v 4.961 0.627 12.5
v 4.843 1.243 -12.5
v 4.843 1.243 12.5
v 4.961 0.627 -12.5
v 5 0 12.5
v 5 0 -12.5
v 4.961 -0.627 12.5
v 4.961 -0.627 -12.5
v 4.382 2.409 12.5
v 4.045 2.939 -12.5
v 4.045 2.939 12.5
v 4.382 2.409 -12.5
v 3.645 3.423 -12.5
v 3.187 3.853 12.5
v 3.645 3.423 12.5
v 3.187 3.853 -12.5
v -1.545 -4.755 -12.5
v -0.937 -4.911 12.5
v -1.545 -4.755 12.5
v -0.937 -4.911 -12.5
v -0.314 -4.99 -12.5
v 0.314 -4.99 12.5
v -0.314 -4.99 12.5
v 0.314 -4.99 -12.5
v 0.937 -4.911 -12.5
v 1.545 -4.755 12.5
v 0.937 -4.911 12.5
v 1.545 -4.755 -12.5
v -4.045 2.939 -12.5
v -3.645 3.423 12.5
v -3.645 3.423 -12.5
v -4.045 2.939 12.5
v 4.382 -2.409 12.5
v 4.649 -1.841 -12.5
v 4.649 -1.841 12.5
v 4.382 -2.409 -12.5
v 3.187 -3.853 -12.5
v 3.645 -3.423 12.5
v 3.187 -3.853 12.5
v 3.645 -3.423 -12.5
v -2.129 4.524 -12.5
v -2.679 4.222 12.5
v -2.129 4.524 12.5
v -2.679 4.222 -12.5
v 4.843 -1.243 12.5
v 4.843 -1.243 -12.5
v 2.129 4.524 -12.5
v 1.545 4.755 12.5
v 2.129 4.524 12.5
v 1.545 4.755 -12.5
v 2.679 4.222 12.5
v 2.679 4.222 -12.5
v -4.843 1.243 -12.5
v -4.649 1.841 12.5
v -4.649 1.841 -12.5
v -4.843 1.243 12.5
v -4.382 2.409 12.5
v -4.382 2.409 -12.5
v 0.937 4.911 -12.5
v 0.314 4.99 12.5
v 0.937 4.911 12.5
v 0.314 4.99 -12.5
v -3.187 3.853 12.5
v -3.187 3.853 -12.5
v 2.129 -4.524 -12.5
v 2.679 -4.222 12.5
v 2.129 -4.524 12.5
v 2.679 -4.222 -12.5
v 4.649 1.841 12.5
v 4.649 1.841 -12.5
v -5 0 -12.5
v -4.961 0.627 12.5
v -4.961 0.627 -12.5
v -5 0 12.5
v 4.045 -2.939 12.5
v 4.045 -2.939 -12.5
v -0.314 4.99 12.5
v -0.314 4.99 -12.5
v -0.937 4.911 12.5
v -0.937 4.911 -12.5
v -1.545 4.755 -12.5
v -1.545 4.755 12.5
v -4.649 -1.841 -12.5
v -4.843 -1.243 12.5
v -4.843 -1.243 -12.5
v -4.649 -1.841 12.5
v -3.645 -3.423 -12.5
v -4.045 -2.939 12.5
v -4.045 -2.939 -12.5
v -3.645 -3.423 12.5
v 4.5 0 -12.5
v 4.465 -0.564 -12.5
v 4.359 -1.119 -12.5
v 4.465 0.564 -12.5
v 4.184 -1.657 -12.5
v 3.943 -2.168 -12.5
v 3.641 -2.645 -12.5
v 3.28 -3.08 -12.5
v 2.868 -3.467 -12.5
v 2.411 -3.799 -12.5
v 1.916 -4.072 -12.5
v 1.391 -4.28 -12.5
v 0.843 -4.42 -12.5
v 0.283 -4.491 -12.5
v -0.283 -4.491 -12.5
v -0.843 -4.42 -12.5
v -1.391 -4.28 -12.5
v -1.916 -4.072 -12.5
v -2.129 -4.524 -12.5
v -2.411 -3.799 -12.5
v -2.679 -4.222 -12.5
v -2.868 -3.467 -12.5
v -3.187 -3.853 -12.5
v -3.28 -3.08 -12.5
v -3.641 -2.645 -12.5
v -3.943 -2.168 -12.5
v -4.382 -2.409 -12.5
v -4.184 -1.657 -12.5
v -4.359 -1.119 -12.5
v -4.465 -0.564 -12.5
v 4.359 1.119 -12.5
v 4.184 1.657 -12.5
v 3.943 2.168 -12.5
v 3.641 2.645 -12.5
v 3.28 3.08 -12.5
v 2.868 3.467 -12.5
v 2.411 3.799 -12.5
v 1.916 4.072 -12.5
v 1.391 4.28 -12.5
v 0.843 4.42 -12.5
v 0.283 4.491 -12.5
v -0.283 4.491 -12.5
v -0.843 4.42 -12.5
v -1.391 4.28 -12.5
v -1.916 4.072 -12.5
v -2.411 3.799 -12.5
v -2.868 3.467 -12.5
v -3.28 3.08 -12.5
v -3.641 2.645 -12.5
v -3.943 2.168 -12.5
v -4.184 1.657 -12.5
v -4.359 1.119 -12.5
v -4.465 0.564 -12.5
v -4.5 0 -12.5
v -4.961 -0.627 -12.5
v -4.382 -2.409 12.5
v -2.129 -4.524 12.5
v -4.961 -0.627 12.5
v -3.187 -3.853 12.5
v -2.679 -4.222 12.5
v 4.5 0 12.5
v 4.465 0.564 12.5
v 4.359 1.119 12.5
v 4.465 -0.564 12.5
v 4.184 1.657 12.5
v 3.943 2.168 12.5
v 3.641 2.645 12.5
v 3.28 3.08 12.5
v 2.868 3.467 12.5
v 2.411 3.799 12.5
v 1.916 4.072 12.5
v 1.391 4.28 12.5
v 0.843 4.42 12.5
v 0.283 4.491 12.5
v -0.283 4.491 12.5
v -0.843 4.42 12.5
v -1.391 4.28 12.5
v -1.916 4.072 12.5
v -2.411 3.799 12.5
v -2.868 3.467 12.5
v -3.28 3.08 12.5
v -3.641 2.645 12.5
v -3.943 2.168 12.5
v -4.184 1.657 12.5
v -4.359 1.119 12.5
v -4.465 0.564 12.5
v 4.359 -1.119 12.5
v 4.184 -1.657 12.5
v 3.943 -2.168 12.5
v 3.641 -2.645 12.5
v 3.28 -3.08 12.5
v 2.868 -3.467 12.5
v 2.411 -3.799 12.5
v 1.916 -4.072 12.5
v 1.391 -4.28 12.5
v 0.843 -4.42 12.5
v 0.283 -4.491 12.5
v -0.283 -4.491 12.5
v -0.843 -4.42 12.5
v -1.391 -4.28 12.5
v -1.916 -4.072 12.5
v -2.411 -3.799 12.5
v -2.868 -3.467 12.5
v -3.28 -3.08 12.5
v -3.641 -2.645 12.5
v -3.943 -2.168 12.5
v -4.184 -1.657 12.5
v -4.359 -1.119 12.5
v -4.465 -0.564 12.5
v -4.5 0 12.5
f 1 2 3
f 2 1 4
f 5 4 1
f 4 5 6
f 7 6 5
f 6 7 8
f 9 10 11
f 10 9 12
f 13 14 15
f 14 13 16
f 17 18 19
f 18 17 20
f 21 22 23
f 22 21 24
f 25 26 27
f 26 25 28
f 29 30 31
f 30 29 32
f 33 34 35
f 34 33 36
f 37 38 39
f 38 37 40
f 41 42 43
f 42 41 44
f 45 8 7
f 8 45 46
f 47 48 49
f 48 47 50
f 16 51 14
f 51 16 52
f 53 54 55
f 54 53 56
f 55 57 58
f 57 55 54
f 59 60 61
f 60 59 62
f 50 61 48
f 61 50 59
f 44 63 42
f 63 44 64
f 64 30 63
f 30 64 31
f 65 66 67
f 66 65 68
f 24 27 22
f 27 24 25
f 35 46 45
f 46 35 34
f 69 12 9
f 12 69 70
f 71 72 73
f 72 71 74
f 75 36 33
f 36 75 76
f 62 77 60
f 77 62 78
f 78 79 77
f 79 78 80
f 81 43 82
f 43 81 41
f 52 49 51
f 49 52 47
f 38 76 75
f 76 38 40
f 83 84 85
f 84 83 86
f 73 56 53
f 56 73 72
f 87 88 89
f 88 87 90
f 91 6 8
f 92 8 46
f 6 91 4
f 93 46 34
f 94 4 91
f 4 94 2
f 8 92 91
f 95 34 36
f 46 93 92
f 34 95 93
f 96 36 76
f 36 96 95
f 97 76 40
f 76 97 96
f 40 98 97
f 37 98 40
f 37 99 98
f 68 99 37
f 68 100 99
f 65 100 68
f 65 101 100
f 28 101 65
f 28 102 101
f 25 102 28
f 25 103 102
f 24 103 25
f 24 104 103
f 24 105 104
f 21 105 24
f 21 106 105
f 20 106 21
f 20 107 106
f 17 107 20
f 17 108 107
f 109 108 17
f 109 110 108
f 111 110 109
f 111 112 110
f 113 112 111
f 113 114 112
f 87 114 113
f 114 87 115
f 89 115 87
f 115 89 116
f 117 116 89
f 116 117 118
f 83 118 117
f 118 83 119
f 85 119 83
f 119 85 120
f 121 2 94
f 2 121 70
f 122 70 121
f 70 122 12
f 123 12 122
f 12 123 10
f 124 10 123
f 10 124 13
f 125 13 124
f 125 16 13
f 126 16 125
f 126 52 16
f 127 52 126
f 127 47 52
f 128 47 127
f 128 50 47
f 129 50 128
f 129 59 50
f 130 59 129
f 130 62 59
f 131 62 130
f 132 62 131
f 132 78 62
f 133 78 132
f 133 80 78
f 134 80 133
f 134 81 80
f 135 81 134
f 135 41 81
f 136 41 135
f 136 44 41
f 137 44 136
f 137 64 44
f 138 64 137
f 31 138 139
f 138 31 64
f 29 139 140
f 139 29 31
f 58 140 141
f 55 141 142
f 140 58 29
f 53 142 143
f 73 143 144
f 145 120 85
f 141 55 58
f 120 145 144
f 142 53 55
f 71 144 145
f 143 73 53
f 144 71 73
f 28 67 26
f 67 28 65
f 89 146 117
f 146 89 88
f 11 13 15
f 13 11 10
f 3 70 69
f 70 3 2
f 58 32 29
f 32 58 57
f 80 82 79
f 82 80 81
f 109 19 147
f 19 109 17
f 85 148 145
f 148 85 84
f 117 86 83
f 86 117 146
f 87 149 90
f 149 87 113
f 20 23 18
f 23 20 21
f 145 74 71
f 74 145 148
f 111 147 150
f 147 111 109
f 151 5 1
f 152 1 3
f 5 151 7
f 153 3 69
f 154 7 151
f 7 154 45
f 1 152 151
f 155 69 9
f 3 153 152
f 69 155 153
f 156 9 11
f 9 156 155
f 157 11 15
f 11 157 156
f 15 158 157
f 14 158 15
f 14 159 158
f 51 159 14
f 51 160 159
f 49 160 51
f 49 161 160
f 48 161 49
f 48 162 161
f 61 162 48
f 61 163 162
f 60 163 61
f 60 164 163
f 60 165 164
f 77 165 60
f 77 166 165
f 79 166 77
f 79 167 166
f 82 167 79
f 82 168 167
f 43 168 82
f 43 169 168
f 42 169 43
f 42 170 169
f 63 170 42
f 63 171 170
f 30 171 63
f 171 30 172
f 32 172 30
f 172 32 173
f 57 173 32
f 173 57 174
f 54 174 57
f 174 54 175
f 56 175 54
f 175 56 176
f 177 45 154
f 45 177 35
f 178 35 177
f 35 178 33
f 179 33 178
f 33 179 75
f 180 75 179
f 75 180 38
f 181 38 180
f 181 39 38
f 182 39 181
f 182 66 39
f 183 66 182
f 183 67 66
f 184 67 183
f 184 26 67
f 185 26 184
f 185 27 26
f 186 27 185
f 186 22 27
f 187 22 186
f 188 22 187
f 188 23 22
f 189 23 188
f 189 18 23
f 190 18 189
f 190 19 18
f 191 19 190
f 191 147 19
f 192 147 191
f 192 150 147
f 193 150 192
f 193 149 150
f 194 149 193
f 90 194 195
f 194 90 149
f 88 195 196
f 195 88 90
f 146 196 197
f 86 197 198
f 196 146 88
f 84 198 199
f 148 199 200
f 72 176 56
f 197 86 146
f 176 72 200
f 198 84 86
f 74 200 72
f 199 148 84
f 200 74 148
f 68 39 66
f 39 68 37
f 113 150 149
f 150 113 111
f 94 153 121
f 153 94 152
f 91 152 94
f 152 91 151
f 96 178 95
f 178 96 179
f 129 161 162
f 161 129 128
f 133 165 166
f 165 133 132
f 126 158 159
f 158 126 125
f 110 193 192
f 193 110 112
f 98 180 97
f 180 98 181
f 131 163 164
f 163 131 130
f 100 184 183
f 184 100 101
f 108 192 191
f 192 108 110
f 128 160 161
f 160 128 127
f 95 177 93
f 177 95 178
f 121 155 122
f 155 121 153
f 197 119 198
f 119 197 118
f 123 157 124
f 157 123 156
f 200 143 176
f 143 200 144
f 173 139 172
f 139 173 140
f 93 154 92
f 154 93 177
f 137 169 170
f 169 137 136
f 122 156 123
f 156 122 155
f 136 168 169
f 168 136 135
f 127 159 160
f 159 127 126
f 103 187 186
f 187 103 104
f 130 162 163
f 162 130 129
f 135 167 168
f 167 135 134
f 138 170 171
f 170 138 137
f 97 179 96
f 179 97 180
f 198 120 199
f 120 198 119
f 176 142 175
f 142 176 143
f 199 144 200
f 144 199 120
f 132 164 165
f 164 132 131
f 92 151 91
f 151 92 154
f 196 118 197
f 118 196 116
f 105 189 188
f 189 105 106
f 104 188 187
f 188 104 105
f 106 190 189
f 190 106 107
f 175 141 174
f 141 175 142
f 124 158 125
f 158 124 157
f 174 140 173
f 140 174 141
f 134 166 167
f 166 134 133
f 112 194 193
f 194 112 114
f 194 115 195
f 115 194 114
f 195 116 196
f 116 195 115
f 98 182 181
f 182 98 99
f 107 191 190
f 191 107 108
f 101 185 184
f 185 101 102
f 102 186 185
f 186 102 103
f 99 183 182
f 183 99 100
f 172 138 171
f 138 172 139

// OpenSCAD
$fn = 50;


difference() {
	union() {
		translate(v = [0, 0, -12.5000000000]) {
			cylinder(h = 25, r = 5.0000000000);
		}
	}
	union() {
		translate(v = [0, 0, -100.0000000000]) {
			cylinder(h = 200, r = 4.5000000000);
		}
	}
}
